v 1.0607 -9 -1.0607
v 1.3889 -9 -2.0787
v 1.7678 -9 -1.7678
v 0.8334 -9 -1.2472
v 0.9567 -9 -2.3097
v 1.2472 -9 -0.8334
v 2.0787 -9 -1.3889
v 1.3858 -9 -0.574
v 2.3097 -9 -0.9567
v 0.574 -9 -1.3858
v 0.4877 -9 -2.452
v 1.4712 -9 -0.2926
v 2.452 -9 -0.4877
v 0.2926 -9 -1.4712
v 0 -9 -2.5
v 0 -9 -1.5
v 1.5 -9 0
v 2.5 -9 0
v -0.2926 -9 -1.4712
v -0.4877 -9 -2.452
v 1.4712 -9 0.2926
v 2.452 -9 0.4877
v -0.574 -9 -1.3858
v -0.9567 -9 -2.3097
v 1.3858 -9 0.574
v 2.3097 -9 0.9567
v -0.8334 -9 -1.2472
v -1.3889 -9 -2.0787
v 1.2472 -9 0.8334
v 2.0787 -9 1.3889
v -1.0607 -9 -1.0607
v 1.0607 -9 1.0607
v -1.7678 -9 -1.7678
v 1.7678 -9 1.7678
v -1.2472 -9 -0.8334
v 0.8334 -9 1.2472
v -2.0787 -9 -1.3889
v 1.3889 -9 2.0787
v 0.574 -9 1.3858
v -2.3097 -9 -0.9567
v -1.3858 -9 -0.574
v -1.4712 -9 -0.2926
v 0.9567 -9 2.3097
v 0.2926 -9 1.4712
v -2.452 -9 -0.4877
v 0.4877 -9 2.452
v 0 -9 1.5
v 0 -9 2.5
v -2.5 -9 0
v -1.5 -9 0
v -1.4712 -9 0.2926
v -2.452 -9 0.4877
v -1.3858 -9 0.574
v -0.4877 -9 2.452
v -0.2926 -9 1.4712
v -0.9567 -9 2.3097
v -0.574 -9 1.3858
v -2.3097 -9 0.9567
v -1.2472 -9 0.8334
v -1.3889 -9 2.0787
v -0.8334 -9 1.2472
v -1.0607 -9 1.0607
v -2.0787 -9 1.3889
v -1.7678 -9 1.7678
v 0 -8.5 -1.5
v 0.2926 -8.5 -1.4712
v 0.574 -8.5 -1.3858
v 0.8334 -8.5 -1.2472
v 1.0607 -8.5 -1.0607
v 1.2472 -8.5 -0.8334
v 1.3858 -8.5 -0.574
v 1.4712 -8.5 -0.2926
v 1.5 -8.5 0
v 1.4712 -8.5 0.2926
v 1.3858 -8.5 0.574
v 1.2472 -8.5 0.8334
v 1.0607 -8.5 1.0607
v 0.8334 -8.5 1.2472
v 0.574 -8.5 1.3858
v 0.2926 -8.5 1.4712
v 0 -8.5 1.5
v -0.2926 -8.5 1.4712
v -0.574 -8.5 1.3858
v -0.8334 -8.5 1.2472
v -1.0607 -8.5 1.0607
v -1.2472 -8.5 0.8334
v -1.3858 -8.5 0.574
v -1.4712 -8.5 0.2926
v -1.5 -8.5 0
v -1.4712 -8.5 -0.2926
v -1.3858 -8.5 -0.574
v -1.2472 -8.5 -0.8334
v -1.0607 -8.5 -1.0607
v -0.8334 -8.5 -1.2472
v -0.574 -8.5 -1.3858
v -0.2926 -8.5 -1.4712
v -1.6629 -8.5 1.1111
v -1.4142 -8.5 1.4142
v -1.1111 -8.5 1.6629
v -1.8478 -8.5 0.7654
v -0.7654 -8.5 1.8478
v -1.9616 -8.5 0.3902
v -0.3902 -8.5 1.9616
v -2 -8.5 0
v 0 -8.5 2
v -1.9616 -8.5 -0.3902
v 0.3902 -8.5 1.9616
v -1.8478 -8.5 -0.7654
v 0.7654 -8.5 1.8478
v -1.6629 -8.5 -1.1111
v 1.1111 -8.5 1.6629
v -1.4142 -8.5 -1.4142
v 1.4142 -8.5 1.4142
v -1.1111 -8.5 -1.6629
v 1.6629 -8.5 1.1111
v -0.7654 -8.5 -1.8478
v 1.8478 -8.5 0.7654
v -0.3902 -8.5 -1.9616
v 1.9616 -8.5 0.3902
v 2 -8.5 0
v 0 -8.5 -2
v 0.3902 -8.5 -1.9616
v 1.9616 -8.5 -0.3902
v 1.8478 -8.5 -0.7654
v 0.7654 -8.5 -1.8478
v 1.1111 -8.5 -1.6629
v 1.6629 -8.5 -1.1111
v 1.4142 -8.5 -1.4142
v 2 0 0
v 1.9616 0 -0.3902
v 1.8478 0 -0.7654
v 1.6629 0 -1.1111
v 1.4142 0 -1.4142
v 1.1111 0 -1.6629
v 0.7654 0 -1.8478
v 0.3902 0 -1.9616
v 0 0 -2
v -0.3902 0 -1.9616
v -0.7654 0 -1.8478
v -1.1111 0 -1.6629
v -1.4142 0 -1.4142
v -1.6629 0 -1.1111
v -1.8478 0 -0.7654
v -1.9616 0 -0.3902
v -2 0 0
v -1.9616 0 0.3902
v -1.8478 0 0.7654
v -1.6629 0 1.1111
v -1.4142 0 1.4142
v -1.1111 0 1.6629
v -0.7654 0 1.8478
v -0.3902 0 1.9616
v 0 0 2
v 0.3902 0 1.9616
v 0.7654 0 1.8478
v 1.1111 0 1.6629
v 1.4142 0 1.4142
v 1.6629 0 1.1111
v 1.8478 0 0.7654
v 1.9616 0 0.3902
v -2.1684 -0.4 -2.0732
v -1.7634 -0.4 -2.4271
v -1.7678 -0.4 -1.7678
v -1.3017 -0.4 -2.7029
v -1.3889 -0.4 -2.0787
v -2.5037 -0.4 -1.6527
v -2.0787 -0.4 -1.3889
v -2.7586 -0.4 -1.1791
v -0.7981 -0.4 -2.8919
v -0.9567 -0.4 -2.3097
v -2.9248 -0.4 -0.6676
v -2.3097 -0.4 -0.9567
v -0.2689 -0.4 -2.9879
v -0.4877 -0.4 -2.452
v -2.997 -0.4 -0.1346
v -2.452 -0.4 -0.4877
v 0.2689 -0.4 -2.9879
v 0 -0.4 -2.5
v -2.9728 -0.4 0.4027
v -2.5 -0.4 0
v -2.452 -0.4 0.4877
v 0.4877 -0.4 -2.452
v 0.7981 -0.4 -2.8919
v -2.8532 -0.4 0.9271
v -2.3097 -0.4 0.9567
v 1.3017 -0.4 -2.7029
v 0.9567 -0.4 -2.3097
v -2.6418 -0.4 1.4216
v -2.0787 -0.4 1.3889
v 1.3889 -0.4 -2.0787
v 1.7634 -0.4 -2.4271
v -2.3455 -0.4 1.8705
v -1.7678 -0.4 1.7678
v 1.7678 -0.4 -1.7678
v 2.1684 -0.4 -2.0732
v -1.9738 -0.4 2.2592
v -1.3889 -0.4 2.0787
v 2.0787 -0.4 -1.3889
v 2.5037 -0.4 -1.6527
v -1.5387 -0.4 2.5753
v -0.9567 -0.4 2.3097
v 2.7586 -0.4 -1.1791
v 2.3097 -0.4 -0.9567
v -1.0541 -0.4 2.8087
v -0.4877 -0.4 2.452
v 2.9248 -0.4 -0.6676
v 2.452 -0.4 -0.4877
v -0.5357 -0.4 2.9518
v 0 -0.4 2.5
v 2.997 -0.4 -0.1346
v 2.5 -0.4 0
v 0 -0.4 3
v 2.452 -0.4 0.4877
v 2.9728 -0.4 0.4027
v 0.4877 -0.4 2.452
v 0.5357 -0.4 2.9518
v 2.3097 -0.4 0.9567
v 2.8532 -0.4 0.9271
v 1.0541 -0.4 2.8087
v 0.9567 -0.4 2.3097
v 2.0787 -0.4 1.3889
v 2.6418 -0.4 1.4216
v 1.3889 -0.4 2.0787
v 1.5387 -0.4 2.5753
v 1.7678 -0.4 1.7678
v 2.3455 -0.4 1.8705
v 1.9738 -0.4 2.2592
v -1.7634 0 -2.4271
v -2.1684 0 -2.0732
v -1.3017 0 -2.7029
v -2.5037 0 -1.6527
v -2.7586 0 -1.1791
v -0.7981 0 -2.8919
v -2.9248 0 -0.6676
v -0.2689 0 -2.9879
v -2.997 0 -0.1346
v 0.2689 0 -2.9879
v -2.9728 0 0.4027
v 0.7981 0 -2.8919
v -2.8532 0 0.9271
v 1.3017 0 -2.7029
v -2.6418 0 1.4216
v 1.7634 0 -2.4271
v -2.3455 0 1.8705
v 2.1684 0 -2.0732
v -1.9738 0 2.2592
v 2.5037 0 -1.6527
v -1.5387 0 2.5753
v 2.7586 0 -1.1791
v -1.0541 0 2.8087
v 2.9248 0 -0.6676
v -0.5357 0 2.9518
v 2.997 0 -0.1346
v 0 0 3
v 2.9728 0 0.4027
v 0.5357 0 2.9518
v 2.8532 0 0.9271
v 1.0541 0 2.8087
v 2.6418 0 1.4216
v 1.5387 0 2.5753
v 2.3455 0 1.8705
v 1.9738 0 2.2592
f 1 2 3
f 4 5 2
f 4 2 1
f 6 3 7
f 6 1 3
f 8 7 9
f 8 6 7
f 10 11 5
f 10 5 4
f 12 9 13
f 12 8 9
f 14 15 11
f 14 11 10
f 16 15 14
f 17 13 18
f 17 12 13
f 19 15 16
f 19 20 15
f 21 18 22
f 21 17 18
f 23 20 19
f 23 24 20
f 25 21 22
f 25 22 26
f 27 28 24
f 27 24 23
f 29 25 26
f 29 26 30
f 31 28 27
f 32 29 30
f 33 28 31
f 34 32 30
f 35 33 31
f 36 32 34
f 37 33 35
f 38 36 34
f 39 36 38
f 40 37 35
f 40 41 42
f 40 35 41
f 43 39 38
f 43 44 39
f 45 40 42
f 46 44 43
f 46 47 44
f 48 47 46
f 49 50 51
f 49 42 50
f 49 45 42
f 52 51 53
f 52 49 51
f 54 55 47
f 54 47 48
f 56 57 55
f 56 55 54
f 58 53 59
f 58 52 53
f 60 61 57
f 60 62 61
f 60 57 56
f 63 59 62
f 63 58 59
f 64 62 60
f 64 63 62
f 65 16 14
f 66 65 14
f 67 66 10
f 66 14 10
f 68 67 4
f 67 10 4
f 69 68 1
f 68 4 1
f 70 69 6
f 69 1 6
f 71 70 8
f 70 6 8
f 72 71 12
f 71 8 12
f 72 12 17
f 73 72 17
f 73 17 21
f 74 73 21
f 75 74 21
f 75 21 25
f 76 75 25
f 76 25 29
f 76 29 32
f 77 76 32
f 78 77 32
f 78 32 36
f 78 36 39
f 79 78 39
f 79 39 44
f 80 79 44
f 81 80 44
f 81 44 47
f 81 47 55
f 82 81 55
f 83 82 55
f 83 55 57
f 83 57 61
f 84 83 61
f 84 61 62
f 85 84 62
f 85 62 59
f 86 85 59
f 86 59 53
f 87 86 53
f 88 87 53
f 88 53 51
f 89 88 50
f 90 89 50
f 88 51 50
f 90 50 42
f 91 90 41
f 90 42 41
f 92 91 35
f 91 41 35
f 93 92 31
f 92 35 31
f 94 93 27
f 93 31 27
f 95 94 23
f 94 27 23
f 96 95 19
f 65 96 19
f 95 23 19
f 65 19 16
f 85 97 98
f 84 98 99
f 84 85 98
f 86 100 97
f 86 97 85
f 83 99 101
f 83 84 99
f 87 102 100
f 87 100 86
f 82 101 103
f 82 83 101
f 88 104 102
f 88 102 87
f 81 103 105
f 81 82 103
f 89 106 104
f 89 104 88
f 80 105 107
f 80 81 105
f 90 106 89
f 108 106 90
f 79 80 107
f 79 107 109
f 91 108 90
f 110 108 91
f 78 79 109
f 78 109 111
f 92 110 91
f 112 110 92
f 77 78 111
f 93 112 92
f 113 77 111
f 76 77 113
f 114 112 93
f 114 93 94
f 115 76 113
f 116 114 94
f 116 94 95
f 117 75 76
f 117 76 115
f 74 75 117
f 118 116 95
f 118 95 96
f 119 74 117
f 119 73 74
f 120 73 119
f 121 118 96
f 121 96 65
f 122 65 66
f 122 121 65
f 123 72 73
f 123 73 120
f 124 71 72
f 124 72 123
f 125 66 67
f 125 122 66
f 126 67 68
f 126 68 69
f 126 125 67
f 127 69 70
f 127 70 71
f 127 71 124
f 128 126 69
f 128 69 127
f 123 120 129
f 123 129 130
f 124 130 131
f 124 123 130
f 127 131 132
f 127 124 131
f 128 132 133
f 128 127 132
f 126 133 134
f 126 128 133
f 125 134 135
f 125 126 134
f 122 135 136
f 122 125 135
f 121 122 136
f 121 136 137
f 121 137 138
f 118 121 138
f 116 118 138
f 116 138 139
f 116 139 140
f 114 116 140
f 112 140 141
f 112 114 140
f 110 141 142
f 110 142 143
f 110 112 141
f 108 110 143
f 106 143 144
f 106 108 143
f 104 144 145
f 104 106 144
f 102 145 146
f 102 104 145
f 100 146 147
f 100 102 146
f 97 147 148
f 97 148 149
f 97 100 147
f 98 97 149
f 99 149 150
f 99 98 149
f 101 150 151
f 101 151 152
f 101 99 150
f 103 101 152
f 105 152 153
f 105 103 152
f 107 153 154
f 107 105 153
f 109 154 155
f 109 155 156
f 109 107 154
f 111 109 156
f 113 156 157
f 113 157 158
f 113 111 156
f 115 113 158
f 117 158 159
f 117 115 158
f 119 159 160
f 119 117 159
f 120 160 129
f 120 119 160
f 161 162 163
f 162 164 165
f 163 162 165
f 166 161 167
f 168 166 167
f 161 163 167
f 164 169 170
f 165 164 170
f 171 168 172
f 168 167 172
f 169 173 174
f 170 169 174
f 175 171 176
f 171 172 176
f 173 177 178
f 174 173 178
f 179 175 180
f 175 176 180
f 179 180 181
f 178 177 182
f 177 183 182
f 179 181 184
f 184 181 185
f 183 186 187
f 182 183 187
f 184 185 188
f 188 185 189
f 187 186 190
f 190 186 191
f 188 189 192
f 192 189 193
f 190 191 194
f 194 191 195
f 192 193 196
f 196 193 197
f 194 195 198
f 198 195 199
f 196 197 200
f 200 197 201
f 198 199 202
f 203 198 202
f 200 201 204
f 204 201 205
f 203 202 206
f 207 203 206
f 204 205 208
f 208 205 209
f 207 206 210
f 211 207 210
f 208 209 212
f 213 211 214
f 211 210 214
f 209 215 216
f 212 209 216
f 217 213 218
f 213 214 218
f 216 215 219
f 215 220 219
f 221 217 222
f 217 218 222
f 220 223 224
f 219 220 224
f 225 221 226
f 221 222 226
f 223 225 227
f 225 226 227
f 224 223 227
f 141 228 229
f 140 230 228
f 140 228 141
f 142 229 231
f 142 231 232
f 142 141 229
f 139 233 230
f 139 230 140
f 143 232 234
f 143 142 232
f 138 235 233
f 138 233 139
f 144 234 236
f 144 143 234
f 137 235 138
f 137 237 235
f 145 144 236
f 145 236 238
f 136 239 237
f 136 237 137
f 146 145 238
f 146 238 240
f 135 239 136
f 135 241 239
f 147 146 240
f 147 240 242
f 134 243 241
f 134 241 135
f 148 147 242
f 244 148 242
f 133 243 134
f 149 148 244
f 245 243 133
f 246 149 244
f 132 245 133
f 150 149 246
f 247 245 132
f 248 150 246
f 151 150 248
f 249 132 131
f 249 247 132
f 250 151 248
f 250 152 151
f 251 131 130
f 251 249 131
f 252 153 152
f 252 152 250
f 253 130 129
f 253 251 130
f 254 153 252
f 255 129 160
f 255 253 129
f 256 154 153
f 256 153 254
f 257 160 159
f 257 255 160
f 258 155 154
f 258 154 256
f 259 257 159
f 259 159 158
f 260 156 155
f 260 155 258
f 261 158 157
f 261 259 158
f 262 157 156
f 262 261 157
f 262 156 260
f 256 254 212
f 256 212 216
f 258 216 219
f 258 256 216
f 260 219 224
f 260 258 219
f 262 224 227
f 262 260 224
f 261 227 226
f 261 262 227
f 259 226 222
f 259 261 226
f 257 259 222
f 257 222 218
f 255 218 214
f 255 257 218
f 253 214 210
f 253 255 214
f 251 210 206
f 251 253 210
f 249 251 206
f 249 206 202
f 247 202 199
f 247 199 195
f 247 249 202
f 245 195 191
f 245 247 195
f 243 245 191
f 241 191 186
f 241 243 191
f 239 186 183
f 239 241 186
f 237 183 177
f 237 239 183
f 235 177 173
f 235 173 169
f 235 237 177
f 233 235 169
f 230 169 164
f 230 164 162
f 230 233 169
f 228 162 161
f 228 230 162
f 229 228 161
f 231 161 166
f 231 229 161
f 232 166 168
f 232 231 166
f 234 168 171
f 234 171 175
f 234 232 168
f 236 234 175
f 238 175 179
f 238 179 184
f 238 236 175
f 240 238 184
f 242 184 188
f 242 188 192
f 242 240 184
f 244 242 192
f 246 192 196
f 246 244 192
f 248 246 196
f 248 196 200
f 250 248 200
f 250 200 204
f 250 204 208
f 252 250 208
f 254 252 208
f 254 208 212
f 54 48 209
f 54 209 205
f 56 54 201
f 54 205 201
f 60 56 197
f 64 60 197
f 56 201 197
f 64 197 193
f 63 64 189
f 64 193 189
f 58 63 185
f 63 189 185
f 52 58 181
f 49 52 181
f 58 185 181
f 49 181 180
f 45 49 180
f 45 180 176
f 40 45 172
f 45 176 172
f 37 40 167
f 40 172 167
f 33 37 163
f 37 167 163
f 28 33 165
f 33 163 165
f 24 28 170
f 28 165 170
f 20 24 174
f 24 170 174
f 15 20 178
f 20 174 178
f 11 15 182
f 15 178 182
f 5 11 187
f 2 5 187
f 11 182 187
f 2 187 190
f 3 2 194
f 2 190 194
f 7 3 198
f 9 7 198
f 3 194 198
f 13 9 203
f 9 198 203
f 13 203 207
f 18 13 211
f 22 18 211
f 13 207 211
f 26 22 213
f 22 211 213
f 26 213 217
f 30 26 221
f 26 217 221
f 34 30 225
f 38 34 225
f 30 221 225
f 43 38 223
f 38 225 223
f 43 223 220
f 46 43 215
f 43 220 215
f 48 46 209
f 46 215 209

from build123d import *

# Parameters (mm, degrees)
SKETCH1_R           = 3
BOSS_EXTRUDE1_DEPTH = 0.4
SKETCH2_R           = 2.5
BOSS_EXTRUDE2_DEPTH = 8.6
SHELL1_START        = -8.5
SHELL1_OUTLINE_R    = 2
SHELL1_DEPTH        = 8.5
CUT_EXTRUDE1_REACH  = 11.95
SKETCH3_R           = 1.5


# Read off the part's stored shape, not the designer's step: Shell1
with BuildPart() as part:
    # Sketch1 → Boss-Extrude1 (new body)
    with BuildSketch(Plane(origin=(0, 0, 0), x_dir=(1, 0, 0), z_dir=(0, 1, 0))):
        with Locations(Location((0, 0, 0), (0, 0, 270))):
            Circle(SKETCH1_R)
    extrude(amount=-BOSS_EXTRUDE1_DEPTH)

    # Sketch2 → Boss-Extrude2 (add)
    with BuildSketch(Plane.XZ.offset(0.4)):
        with Locations(Location((0, 0, 0), (0, 0, 90))):
            Circle(SKETCH2_R)
    extrude(amount=BOSS_EXTRUDE2_DEPTH)

    # Shell1 outline → Shell1 (cut)
    with BuildSketch(Plane(origin=(0, 0, 0), x_dir=(1, 0, 0), z_dir=(0, 1, 0)).offset(SHELL1_START)):
        Circle(SHELL1_OUTLINE_R)
    extrude(amount=SHELL1_DEPTH, mode=Mode.SUBTRACT)

    # Sketch3 → Cut-Extrude1 (cut, up to next)
    with BuildSketch(Plane.XZ.offset(9), mode=Mode.PRIVATE) as cut_extrude1_sk1:
        with Locations(Location((0, 0, 0), (0, 0, 270))):
            Circle(SKETCH3_R)
    cut_extrude1_tool1 = extrude(cut_extrude1_sk1.sketch, amount=-CUT_EXTRUDE1_REACH, mode=Mode.PRIVATE) & part.part
    add(cut_extrude1_tool1.solids().sort_by_distance((0, -9, 0))[0], mode=Mode.SUBTRACT)


solid = part.part
